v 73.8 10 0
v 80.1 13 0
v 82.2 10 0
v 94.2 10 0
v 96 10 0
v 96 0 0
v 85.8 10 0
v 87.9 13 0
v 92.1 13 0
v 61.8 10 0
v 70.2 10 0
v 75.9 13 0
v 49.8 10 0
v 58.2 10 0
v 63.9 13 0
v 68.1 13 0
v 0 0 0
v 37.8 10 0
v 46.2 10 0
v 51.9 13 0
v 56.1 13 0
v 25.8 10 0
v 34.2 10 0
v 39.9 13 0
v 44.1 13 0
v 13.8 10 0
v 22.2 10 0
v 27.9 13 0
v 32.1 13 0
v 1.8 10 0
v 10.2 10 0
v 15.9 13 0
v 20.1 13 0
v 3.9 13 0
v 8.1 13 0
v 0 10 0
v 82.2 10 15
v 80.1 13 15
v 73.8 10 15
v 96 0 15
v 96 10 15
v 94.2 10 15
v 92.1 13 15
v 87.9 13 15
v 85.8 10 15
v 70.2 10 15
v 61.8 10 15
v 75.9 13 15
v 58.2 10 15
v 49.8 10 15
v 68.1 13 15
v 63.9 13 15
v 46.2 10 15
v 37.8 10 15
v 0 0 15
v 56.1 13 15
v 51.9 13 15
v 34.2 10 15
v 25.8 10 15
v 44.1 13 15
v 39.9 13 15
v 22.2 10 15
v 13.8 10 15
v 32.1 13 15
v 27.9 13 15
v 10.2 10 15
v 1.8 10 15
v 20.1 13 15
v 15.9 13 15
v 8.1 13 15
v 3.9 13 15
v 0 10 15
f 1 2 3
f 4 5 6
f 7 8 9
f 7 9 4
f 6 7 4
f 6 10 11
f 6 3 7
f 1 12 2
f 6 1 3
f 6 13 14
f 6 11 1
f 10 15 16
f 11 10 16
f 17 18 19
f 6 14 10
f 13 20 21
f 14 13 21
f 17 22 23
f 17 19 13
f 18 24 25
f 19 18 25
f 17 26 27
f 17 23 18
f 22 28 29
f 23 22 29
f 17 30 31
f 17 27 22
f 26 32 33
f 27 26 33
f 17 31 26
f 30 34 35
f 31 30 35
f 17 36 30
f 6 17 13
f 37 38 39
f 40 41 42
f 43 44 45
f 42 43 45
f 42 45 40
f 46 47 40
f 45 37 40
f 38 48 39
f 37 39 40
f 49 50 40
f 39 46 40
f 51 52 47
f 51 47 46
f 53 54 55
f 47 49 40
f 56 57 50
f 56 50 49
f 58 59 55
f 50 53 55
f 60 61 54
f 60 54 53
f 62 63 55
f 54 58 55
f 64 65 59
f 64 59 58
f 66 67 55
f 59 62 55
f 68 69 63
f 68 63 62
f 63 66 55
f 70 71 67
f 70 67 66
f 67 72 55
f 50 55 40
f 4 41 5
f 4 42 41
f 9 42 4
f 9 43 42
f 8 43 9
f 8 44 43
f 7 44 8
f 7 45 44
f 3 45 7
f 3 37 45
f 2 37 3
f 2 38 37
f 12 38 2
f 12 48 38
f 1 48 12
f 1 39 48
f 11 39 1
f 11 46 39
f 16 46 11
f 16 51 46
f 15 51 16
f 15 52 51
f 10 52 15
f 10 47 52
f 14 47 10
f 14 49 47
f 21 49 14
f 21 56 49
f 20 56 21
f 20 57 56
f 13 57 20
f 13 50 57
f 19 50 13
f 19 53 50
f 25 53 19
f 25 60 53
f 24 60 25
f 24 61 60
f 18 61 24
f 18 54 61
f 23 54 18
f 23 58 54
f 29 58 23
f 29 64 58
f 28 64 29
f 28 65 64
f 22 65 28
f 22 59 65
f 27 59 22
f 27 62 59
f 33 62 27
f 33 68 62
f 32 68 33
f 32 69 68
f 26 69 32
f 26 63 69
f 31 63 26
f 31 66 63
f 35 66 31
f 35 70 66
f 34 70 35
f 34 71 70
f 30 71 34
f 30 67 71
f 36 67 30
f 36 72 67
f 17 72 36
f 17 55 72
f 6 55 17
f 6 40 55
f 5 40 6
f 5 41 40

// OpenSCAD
$fn = 32;

// ----------------------------------------------------------------------
// Gear rack: 8 teeth, pitch 12 mm
// ----------------------------------------------------------------------

// --- parameters (mm) ---
teeth = 8;                // number of teeth
pitch = 12;               // tooth pitch, X
root_w = 8.4;             // tooth width at the root
tip_w = 4.2;              // tooth width at the tip
base_h = 10;              // rack body height, Y
tooth_h = 3;              // tooth height above the body
plate_t = 15;             // rack width, Z (extrusion height)

rack_l = teeth * pitch;  // overall length
total_h = base_h + tooth_h;  // overall height

profile = [[0, 0], [96, 0], [96, 10], [94.2, 10], [92.1, 13], [87.9, 13], [85.8, 10], [82.2, 10], [80.1, 13], [75.9, 13], [73.8, 10], [70.2, 10], [68.1, 13], [63.9, 13], [61.8, 10], [58.2, 10], [56.1, 13], [51.9, 13], [49.8, 10], [46.2, 10], [44.1, 13], [39.9, 13], [37.8, 10], [34.2, 10], [32.1, 13], [27.9, 13], [25.8, 10], [22.2, 10], [20.1, 13], [15.9, 13], [13.8, 10], [10.2, 10], [8.1, 13], [3.9, 13], [1.8, 10], [0, 10]];  // primary outline, 36 points, counter clockwise

// --- the one profile operation ---
linear_extrude(height = plate_t) polygon(points = profile);
